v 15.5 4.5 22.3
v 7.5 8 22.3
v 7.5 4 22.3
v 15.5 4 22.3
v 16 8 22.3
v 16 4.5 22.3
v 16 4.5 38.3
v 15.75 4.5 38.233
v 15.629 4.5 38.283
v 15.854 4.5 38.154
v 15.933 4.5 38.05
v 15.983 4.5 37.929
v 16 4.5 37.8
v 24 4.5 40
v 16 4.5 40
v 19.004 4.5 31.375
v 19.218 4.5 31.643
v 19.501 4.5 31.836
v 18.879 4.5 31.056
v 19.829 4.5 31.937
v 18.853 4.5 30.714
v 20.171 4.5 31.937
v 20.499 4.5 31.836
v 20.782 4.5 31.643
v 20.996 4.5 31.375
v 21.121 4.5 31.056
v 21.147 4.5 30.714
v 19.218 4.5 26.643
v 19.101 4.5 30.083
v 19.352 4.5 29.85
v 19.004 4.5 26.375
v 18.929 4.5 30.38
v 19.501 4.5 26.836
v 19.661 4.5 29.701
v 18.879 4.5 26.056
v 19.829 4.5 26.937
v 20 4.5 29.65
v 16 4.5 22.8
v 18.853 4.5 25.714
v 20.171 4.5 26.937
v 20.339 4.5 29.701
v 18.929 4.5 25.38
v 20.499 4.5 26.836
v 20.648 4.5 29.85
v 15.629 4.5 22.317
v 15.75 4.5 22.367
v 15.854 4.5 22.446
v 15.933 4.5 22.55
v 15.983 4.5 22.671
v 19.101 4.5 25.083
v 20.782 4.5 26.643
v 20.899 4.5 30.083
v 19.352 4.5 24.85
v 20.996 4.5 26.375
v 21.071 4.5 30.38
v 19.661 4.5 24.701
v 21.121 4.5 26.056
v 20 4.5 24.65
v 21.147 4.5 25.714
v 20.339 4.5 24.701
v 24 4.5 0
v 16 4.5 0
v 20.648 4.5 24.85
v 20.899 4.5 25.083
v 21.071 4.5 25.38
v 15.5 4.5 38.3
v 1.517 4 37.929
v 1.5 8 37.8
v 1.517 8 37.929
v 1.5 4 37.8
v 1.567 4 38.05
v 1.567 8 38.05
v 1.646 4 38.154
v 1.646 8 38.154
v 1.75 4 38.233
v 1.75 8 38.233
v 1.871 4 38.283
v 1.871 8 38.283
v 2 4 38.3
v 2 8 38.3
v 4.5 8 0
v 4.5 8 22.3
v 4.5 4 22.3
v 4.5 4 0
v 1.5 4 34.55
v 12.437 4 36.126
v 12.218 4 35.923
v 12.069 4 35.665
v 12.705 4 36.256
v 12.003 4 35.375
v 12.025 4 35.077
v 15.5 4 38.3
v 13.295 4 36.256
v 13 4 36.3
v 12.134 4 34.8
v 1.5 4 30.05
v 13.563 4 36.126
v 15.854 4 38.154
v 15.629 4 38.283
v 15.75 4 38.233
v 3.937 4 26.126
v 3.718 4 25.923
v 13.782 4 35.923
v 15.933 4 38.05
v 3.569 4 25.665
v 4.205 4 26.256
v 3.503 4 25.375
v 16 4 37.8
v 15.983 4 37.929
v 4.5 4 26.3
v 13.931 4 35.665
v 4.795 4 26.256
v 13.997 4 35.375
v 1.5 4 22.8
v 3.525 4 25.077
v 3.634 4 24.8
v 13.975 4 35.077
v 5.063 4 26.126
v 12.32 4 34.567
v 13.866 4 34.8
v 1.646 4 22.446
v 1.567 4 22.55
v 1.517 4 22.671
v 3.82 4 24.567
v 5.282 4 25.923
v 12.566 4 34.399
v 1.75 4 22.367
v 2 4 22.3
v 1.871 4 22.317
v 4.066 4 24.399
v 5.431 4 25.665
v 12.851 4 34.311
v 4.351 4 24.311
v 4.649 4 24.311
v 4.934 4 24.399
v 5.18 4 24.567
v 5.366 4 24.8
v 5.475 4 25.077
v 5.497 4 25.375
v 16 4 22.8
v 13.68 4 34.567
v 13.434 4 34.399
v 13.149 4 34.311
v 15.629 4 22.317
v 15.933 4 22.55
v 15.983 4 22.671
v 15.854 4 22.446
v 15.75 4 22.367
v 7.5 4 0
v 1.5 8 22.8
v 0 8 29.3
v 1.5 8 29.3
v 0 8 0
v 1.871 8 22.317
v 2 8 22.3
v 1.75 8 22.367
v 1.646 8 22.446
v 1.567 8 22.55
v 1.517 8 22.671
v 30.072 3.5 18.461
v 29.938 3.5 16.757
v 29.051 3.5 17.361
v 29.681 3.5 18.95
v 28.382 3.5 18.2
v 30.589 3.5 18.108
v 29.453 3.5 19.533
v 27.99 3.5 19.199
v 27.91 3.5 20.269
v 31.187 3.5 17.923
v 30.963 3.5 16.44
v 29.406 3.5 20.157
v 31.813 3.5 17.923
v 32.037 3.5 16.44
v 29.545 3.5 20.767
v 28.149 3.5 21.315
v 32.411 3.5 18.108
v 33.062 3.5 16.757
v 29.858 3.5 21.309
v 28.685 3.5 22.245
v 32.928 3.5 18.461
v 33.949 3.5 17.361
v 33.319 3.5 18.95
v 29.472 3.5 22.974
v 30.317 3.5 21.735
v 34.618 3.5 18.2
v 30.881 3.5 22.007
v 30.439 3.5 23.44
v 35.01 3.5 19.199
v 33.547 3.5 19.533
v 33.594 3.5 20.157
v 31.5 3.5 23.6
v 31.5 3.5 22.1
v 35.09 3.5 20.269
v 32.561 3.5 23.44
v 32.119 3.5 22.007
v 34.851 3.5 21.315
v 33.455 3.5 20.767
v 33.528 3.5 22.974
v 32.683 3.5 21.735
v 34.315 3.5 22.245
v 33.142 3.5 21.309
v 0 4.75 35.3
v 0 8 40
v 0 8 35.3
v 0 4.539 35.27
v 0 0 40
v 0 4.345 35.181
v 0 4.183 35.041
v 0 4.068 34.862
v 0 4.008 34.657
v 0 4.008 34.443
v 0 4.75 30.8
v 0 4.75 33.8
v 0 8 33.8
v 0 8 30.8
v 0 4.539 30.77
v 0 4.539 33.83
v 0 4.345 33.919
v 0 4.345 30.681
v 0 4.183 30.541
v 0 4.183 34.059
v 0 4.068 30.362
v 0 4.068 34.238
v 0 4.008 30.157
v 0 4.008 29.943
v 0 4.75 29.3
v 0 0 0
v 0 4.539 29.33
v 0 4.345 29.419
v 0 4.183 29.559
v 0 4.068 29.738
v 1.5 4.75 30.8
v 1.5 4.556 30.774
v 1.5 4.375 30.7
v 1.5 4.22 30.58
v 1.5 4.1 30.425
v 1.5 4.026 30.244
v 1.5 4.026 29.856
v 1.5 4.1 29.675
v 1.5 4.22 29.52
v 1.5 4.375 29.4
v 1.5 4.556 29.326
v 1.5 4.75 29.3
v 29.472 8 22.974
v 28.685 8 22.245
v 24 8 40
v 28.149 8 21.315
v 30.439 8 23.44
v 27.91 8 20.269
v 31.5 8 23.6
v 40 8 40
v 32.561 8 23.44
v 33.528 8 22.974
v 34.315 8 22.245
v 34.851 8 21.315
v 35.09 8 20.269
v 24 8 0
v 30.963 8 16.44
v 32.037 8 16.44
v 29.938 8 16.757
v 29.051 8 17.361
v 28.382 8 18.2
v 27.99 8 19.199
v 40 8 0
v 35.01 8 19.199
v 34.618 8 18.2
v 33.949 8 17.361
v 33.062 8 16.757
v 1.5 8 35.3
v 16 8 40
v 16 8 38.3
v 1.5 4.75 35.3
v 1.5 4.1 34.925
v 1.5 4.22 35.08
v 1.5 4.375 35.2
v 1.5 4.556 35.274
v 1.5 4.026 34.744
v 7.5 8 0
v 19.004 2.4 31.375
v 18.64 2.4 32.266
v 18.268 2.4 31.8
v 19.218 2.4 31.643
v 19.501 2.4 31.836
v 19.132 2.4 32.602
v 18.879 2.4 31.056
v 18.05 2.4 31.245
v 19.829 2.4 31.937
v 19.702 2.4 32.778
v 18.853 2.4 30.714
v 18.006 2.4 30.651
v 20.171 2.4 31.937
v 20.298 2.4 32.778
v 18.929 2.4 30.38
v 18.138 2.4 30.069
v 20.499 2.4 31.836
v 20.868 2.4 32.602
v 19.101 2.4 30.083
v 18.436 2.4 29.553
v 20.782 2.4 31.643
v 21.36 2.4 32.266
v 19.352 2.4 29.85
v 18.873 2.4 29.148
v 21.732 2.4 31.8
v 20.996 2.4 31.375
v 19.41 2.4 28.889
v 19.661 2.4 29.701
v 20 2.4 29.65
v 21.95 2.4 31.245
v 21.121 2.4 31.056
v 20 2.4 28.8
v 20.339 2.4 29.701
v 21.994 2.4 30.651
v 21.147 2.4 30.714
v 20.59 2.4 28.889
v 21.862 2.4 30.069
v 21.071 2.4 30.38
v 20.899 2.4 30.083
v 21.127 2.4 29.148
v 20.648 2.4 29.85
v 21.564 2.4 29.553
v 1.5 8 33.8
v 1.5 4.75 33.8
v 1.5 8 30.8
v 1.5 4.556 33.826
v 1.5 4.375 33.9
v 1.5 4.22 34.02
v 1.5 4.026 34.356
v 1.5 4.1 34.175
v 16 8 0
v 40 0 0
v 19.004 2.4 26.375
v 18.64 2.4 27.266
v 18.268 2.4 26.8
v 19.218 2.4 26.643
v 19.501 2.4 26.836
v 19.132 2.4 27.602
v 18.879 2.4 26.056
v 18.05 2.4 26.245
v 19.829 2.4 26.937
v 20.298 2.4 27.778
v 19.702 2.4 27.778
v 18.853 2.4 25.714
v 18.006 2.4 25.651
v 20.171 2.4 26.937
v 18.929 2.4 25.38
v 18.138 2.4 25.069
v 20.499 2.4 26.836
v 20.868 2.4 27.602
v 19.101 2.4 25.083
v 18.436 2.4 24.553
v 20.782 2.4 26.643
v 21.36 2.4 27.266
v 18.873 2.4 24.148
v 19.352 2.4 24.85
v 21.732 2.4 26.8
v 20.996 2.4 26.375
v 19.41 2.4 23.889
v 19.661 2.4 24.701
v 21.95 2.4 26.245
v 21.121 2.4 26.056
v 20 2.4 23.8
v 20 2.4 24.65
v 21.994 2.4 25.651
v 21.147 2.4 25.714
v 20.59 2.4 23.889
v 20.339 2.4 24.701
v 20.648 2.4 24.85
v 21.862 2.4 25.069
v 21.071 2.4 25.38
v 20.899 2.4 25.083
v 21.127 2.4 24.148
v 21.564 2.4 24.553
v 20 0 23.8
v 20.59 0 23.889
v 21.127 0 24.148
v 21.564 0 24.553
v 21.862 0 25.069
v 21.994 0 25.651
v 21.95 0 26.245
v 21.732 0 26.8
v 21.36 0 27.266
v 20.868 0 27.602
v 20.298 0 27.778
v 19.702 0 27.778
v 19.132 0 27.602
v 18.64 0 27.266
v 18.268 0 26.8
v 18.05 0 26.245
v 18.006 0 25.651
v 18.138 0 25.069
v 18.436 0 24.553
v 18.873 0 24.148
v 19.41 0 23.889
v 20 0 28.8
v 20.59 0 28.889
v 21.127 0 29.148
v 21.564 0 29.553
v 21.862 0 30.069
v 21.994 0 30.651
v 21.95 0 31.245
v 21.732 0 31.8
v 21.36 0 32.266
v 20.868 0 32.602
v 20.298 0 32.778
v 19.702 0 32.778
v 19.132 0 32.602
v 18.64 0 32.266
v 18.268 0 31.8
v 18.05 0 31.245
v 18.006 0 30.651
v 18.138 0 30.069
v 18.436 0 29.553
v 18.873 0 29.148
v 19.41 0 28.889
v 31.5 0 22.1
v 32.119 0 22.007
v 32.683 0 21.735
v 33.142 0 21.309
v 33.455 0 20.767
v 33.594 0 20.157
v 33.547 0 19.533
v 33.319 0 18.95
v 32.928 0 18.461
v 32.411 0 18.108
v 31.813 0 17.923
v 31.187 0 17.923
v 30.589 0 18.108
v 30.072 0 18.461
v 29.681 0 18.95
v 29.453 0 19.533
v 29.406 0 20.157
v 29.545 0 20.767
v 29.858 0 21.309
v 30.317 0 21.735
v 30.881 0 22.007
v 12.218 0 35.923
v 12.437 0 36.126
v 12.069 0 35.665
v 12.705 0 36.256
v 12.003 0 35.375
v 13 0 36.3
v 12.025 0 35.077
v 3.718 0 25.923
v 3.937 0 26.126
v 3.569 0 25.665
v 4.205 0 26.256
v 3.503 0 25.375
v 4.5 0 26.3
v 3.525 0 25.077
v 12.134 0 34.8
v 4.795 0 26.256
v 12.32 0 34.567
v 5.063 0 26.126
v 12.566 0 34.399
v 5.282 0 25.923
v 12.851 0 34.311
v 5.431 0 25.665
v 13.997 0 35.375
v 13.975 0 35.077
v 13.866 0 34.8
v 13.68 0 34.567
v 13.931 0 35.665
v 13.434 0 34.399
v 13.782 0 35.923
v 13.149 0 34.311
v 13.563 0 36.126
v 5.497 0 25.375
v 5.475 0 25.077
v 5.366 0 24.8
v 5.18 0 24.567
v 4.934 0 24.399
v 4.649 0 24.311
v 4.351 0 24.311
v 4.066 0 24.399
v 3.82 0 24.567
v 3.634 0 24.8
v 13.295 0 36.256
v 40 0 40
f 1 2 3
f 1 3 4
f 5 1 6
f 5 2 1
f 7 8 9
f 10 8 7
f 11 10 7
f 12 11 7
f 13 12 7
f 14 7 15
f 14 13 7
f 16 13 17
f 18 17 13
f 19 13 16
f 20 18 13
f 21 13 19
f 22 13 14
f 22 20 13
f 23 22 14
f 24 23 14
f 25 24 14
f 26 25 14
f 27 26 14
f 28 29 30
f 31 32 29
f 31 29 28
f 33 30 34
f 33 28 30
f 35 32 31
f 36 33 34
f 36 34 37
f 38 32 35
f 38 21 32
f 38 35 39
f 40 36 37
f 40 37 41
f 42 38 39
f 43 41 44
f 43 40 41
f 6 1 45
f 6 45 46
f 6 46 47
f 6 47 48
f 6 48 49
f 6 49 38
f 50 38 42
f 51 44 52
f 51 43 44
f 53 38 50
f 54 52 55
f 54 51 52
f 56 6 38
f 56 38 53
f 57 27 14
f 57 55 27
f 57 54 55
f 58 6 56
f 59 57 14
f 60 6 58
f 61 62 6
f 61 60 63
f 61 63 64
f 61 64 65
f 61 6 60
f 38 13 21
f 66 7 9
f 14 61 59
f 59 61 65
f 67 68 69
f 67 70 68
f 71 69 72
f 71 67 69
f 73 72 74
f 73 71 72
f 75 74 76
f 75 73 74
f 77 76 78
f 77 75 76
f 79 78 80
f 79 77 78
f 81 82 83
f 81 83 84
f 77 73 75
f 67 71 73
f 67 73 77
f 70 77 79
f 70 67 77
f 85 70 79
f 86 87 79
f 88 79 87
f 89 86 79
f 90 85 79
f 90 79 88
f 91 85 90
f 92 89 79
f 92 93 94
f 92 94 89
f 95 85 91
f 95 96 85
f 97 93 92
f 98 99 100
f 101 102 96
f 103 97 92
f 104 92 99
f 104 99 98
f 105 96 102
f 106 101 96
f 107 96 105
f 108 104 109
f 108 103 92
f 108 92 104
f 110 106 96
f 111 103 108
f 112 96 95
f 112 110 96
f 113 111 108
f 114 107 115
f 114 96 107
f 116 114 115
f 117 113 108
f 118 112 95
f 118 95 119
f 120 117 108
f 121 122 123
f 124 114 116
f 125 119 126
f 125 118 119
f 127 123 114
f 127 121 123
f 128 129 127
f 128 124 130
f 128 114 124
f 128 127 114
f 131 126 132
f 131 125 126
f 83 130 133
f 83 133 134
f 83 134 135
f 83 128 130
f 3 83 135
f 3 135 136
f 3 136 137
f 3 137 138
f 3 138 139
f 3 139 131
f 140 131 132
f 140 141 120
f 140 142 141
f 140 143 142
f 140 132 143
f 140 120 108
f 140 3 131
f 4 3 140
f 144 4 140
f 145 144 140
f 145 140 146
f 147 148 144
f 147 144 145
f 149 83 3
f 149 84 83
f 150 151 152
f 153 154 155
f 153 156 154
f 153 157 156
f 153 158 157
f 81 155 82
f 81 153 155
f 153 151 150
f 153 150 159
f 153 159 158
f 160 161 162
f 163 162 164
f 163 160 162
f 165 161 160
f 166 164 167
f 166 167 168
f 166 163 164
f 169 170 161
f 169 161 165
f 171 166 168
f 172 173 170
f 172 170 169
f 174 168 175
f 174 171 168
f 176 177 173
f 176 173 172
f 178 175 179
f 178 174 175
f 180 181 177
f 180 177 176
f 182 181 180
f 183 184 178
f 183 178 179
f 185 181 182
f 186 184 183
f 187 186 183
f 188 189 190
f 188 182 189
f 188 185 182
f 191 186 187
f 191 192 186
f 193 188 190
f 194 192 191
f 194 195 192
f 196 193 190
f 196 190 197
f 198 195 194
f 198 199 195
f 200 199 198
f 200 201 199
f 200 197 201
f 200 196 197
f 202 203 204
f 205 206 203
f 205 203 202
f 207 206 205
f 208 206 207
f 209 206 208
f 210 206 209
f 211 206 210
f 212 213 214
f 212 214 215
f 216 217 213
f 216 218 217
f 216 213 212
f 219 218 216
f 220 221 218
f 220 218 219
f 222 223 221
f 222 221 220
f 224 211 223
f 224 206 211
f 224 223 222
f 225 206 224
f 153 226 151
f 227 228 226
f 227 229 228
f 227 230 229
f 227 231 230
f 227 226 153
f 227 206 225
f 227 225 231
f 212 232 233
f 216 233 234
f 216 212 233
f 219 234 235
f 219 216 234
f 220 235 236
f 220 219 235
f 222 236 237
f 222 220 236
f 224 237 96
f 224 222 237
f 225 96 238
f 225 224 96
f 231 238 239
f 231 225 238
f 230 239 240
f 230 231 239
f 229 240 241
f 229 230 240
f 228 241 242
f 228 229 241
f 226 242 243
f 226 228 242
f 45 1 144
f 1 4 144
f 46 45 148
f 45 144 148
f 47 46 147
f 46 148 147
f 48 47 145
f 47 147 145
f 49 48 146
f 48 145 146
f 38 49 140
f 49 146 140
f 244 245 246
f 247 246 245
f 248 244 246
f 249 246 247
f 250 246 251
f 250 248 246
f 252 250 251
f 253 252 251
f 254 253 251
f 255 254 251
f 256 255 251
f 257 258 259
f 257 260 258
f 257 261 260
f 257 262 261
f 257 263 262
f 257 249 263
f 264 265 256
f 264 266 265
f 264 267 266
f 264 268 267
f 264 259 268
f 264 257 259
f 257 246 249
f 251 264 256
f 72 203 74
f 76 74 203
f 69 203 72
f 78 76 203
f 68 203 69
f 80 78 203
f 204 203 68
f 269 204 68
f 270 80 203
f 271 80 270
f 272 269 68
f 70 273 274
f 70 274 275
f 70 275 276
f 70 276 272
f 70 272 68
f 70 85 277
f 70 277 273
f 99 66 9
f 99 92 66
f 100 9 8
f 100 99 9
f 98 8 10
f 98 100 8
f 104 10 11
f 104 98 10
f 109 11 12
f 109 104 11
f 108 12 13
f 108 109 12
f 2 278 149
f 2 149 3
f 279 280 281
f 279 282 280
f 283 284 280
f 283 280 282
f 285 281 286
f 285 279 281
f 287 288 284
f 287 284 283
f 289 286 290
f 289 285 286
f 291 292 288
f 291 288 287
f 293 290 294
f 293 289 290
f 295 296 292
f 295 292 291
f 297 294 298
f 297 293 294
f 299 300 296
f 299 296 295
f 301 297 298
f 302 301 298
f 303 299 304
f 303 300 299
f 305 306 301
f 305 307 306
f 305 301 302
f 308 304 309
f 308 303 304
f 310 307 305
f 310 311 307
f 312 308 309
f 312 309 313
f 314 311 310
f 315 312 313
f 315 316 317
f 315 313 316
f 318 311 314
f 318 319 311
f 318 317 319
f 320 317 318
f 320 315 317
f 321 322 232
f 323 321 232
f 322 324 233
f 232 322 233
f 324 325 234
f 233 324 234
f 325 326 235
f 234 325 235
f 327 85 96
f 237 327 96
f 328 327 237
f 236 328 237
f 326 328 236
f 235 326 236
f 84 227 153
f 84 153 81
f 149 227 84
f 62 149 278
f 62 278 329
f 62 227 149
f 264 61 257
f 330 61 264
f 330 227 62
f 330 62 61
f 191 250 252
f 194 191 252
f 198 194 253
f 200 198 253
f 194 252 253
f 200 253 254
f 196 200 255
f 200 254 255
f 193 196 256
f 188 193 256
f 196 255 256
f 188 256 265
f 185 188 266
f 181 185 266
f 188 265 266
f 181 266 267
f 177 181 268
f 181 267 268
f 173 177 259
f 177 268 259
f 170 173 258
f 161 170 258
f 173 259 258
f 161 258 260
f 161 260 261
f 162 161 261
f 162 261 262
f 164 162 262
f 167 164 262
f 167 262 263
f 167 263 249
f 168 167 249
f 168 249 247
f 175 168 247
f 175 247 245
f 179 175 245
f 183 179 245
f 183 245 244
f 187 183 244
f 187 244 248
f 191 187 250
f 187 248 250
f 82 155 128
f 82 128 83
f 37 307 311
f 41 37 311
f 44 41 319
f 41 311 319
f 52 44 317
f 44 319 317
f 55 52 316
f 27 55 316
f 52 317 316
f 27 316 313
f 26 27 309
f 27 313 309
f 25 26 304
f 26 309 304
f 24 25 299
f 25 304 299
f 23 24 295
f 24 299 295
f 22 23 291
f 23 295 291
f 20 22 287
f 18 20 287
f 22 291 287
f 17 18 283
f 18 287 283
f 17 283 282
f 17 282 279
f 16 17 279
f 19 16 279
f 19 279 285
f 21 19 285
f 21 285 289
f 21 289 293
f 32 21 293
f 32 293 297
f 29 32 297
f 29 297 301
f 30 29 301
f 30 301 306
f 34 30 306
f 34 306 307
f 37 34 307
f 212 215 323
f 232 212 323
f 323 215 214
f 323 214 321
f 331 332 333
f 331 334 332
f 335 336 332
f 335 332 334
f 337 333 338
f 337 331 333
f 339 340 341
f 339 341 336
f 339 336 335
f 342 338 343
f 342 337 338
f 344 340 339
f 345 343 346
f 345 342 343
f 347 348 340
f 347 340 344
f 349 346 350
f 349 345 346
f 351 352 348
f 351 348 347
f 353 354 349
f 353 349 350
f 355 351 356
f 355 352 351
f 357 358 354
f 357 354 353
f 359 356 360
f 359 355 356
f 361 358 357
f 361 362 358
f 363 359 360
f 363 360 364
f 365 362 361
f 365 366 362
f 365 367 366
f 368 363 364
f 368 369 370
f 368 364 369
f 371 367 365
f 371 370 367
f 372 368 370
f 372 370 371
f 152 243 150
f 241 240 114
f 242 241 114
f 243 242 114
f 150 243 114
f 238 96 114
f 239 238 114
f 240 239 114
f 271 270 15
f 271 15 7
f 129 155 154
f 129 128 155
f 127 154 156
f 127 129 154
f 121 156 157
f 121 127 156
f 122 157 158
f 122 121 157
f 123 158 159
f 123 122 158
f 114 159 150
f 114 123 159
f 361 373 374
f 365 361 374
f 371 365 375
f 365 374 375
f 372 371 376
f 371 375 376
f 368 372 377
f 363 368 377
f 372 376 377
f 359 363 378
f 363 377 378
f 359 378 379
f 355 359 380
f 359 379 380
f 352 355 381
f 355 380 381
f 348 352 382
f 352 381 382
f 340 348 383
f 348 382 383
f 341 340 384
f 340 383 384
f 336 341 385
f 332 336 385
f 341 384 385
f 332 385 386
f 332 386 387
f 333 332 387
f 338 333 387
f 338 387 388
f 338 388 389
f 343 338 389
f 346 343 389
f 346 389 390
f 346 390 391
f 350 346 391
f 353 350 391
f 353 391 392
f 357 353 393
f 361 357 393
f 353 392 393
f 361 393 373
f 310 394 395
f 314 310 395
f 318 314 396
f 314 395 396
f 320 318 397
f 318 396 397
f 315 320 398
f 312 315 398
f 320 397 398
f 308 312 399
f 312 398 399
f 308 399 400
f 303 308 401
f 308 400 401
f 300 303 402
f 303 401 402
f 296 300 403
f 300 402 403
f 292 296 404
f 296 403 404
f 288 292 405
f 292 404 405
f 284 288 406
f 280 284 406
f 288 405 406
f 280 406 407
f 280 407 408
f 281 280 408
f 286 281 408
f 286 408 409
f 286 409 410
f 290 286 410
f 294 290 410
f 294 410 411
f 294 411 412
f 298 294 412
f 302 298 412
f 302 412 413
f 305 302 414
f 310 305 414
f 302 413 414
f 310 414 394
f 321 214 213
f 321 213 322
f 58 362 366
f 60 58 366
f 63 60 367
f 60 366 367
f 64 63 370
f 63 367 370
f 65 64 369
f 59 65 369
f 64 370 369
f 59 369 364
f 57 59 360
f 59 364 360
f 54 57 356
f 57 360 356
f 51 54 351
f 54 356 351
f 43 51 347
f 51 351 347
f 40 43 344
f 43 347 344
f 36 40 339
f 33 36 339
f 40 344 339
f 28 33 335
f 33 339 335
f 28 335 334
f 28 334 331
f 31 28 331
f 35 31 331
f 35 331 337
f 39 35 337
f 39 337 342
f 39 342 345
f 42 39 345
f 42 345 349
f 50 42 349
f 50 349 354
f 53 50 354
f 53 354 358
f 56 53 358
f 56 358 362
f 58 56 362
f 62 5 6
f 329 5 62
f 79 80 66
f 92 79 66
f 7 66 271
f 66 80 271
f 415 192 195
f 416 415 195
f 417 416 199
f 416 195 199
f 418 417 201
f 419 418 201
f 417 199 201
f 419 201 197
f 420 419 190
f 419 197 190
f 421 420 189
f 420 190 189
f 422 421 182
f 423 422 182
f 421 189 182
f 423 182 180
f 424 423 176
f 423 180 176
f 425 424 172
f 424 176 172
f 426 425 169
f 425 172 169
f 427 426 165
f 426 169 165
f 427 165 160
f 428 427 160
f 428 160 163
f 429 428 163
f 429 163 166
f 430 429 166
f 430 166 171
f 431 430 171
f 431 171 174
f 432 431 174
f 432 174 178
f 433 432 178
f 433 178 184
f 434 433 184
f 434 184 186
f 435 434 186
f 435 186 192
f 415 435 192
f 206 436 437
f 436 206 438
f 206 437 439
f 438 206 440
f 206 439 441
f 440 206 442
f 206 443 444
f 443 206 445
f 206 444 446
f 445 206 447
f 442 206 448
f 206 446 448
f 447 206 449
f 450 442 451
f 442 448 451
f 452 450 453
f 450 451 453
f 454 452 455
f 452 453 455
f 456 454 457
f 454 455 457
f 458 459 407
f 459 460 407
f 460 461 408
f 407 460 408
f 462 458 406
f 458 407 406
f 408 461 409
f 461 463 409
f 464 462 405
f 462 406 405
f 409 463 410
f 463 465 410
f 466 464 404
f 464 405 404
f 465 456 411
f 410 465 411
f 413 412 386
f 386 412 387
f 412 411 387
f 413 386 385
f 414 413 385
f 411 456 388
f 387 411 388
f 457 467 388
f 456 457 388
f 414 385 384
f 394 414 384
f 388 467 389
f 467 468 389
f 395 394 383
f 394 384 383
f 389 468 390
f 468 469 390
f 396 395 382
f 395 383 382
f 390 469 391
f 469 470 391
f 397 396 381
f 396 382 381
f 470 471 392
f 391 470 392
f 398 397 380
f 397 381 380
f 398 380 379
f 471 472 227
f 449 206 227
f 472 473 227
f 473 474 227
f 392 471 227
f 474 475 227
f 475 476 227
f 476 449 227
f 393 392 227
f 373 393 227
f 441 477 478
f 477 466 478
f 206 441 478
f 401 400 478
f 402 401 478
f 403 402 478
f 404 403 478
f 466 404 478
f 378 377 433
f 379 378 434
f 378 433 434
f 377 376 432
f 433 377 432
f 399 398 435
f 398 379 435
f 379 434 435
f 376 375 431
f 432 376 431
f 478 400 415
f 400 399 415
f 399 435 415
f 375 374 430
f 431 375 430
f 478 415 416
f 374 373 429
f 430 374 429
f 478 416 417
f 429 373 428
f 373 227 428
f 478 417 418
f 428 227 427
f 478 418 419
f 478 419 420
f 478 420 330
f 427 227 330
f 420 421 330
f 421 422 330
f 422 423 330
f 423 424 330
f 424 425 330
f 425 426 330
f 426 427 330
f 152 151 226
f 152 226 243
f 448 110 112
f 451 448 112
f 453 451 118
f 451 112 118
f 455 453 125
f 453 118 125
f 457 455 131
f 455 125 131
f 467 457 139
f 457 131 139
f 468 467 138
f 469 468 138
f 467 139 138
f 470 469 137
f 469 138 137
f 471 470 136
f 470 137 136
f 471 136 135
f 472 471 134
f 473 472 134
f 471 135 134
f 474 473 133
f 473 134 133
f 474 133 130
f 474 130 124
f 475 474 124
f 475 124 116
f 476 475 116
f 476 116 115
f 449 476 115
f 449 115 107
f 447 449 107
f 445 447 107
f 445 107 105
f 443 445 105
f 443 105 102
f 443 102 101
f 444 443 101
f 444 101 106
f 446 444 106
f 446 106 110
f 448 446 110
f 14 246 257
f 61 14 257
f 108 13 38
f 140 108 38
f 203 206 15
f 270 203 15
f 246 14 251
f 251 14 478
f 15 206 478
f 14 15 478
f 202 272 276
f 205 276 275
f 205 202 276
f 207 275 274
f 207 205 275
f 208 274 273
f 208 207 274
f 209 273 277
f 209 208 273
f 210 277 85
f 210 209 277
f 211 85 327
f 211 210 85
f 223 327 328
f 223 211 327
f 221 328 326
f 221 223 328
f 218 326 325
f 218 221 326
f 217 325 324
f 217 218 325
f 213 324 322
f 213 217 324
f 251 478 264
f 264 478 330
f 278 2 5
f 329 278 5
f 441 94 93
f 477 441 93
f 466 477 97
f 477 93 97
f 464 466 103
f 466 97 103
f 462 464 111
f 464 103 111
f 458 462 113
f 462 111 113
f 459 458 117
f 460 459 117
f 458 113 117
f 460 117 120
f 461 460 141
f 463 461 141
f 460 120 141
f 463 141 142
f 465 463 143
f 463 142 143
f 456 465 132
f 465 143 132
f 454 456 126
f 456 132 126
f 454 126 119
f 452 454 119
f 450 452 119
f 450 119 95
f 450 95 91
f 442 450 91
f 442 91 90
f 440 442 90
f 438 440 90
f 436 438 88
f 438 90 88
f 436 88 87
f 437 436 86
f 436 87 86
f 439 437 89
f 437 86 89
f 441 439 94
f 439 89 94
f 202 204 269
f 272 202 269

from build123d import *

# Parameters (mm, degrees)
SKETCH_1_W           = 40
SKETCH_1_H           = 40
EXTRUDE_1_DEPTH      = 8
SKETCH_2_W           = 8
SKETCH_2_H           = 40
CUT_EXTRUDE_1_DEPTH  = 3.5
SKETCH_3_R           = 1.15
CUT_EXTRUDE_2_DEPTH  = 58.131427428
SKETCH_4_R           = 2
CUT_EXTRUDE_3_DEPTH  = 2.4
SKETCH_5_W           = 14.5
SKETCH_5_H           = 16
CUT_EXTRUDE_4_DEPTH  = 4
FILLET_2_R           = 0.5
SKETCH_6_W           = 1.5
SKETCH_6_H           = 1.5
CUT_EXTRUDE_5_DEPTH  = 4
SKETCH_7_R           = 1
CUT_EXTRUDE_6_DEPTH  = 4
FILLET_3_R           = 0.75
FILLET_4_R           = 0.75
CUT_EXTRUDE_7_DEPTH  = 4
SKETCH_10_R          = 3.6
CUT_EXTRUDE_9_DEPTH  = 4.5
SKETCH_11_R          = 2.1
CUT_EXTRUDE_10_DEPTH = 57.747246629


with BuildPart() as part:
    # 草图1 → 凸台-拉伸1 (new body)
    with BuildSketch(Plane(origin=(0, 0, 0), x_dir=(1, 0, 0), z_dir=(0, 1, 0))):
        with Locations((20, -20)):
            Rectangle(SKETCH_1_W, SKETCH_1_H)
    extrude(amount=EXTRUDE_1_DEPTH)

    # 草图2 → 切除-拉伸1 (cut)
    with BuildSketch(Plane(origin=(0, 8, 0), x_dir=(1, 0, 0), z_dir=(0, 1, 0))):
        with Locations((20, -20)):
            Rectangle(SKETCH_2_W, SKETCH_2_H)
    extrude(amount=-CUT_EXTRUDE_1_DEPTH, mode=Mode.SUBTRACT)

    # 草图3 → 切除-拉伸2 (cut, through all)
    with BuildSketch(Plane(origin=(0, 0, 0), x_dir=(-1, 0, 0), z_dir=(0, -1, 0))):
        with Locations(Location((-20, -30.8, 0), (0, 0, 90))):
            Circle(SKETCH_3_R)
        with Locations(Location((-20, -25.8, 0), (0, 0, 90))):
            Circle(SKETCH_3_R)
    extrude(amount=-CUT_EXTRUDE_2_DEPTH, mode=Mode.SUBTRACT)

    # 草图4 → 切除-拉伸3 (cut)
    with BuildSketch(Plane(origin=(0, 0, 0), x_dir=(-1, 0, 0), z_dir=(0, -1, 0))):
        with Locations(Location((-20, -30.8, 0), (0, 0, 90))):
            Circle(SKETCH_4_R)
        with Locations(Location((-20, -25.8, 0), (0, 0, 90))):
            Circle(SKETCH_4_R)
    extrude(amount=-CUT_EXTRUDE_3_DEPTH, mode=Mode.SUBTRACT)

    # 草图5 → 切除-拉伸4 (cut)
    with BuildSketch(Plane(origin=(0, 8, 0), x_dir=(1, 0, 0), z_dir=(0, 1, 0))):
        with Locations((8.75, -30.3)):
            Rectangle(SKETCH_5_W, SKETCH_5_H)
    extrude(amount=-CUT_EXTRUDE_4_DEPTH, mode=Mode.SUBTRACT)

    # 圆角2
    fillet_2_edges = [part.edges().sort_by_distance(p)[0] for p in [
        (16, 4.25, 22.3),
        (16, 4.25, 38.3),
        (1.5, 6, 38.3),
        (1.5, 6, 22.3),
    ]]
    fillet(fillet_2_edges, radius=FILLET_2_R)

    # 草图6 → 切除-拉伸5 (cut)
    with BuildSketch(Plane(origin=(0, 8, 0), x_dir=(1, 0, 0), z_dir=(0, 1, 0))):
        with Locations((0.75, -34.55)):
            Rectangle(SKETCH_6_W, SKETCH_6_H)
        with Locations((0.75, -30.05)):
            Rectangle(SKETCH_6_W, SKETCH_6_H)
    extrude(amount=-CUT_EXTRUDE_5_DEPTH, mode=Mode.SUBTRACT)

    # 草图7 → 切除-拉伸6 (cut)
    with BuildSketch(Plane(origin=(0, 4, 0), x_dir=(1, 0, 0), z_dir=(0, 1, 0))):
        with Locations(Location((4.5, -25.3, 0), (0, 0, 270))):
            Circle(SKETCH_7_R)
        with Locations(Location((13, -35.3, 0), (0, 0, 270))):
            Circle(SKETCH_7_R)
    extrude(amount=-CUT_EXTRUDE_6_DEPTH, mode=Mode.SUBTRACT)

    # 圆角3
    # the kernel refuses this fillet: 0.75 mm, written as the material it adds along each edge
    with BuildSketch(Plane(origin=(0, 4, 29.3), x_dir=(0, 0, 1), z_dir=(1, 0, 0)), Plane(origin=(1.5, 4, 30.8), x_dir=(0, 0, -1), z_dir=(-1, 0, 0))) as fillet_3_piece_1:
        with BuildLine():
            CenterArc((FILLET_3_R, -FILLET_3_R), FILLET_3_R, 90, 90)
            Line((0, -FILLET_3_R), (0, 0))
            Line((0, 0), (FILLET_3_R, 0))
        make_face()
    extrude(amount=1.5)

    # 圆角4
    # the kernel refuses this fillet: 0.75 mm, written as the material it adds along each edge
    with BuildSketch(Plane(origin=(0, 4, 33.8), x_dir=(0, 0, 1), z_dir=(1, 0, 0)), Plane(origin=(1.5, 4, 35.3), x_dir=(0, 0, -1), z_dir=(-1, 0, 0))) as fillet_4_piece_1:
        with BuildLine():
            CenterArc((FILLET_4_R, -FILLET_4_R), FILLET_4_R, 90, 90)
            Line((0, -FILLET_4_R), (0, 0))
            Line((0, 0), (FILLET_4_R, 0))
        make_face()
    extrude(amount=1.5)

    # 草图8 → 切除-拉伸7 (cut)
    with BuildSketch(Plane(origin=(0, 8, 0), x_dir=(1, 0, 0), z_dir=(0, 1, 0))):
        with BuildLine():
            Line((7.5, 0.415504674), (7.5, -29.155940237))
            ThreePointArc((7.5, -29.155940237), (6, -30.655940237), (4.5, -29.155940237))
            Line((4.5, -29.155940237), (4.5, 0.415504674))
            ThreePointArc((4.5, 0.415504674), (6, 1.915504674), (7.5, 0.415504674))
        make_face()
    extrude(amount=-CUT_EXTRUDE_7_DEPTH, mode=Mode.SUBTRACT)

    # 草图10 → 切除-拉伸9 (cut)
    with BuildSketch(Plane(origin=(0, 8, 0), x_dir=(1, 0, 0), z_dir=(0, 1, 0))):
        with Locations(Location((31.5, -20, 0), (0, 0, 270))):
            Circle(SKETCH_10_R)
    extrude(amount=-CUT_EXTRUDE_9_DEPTH, mode=Mode.SUBTRACT)

    # 草图11 → 切除-拉伸10 (cut, through all)
    with BuildSketch(Plane(origin=(0, 3.5, 0), x_dir=(1, 0, 0), z_dir=(0, 1, 0))):
        with Locations(Location((31.5, -20, 0), (0, 0, 270))):
            Circle(SKETCH_11_R)
    extrude(amount=-CUT_EXTRUDE_10_DEPTH, mode=Mode.SUBTRACT)


solid = part.part
